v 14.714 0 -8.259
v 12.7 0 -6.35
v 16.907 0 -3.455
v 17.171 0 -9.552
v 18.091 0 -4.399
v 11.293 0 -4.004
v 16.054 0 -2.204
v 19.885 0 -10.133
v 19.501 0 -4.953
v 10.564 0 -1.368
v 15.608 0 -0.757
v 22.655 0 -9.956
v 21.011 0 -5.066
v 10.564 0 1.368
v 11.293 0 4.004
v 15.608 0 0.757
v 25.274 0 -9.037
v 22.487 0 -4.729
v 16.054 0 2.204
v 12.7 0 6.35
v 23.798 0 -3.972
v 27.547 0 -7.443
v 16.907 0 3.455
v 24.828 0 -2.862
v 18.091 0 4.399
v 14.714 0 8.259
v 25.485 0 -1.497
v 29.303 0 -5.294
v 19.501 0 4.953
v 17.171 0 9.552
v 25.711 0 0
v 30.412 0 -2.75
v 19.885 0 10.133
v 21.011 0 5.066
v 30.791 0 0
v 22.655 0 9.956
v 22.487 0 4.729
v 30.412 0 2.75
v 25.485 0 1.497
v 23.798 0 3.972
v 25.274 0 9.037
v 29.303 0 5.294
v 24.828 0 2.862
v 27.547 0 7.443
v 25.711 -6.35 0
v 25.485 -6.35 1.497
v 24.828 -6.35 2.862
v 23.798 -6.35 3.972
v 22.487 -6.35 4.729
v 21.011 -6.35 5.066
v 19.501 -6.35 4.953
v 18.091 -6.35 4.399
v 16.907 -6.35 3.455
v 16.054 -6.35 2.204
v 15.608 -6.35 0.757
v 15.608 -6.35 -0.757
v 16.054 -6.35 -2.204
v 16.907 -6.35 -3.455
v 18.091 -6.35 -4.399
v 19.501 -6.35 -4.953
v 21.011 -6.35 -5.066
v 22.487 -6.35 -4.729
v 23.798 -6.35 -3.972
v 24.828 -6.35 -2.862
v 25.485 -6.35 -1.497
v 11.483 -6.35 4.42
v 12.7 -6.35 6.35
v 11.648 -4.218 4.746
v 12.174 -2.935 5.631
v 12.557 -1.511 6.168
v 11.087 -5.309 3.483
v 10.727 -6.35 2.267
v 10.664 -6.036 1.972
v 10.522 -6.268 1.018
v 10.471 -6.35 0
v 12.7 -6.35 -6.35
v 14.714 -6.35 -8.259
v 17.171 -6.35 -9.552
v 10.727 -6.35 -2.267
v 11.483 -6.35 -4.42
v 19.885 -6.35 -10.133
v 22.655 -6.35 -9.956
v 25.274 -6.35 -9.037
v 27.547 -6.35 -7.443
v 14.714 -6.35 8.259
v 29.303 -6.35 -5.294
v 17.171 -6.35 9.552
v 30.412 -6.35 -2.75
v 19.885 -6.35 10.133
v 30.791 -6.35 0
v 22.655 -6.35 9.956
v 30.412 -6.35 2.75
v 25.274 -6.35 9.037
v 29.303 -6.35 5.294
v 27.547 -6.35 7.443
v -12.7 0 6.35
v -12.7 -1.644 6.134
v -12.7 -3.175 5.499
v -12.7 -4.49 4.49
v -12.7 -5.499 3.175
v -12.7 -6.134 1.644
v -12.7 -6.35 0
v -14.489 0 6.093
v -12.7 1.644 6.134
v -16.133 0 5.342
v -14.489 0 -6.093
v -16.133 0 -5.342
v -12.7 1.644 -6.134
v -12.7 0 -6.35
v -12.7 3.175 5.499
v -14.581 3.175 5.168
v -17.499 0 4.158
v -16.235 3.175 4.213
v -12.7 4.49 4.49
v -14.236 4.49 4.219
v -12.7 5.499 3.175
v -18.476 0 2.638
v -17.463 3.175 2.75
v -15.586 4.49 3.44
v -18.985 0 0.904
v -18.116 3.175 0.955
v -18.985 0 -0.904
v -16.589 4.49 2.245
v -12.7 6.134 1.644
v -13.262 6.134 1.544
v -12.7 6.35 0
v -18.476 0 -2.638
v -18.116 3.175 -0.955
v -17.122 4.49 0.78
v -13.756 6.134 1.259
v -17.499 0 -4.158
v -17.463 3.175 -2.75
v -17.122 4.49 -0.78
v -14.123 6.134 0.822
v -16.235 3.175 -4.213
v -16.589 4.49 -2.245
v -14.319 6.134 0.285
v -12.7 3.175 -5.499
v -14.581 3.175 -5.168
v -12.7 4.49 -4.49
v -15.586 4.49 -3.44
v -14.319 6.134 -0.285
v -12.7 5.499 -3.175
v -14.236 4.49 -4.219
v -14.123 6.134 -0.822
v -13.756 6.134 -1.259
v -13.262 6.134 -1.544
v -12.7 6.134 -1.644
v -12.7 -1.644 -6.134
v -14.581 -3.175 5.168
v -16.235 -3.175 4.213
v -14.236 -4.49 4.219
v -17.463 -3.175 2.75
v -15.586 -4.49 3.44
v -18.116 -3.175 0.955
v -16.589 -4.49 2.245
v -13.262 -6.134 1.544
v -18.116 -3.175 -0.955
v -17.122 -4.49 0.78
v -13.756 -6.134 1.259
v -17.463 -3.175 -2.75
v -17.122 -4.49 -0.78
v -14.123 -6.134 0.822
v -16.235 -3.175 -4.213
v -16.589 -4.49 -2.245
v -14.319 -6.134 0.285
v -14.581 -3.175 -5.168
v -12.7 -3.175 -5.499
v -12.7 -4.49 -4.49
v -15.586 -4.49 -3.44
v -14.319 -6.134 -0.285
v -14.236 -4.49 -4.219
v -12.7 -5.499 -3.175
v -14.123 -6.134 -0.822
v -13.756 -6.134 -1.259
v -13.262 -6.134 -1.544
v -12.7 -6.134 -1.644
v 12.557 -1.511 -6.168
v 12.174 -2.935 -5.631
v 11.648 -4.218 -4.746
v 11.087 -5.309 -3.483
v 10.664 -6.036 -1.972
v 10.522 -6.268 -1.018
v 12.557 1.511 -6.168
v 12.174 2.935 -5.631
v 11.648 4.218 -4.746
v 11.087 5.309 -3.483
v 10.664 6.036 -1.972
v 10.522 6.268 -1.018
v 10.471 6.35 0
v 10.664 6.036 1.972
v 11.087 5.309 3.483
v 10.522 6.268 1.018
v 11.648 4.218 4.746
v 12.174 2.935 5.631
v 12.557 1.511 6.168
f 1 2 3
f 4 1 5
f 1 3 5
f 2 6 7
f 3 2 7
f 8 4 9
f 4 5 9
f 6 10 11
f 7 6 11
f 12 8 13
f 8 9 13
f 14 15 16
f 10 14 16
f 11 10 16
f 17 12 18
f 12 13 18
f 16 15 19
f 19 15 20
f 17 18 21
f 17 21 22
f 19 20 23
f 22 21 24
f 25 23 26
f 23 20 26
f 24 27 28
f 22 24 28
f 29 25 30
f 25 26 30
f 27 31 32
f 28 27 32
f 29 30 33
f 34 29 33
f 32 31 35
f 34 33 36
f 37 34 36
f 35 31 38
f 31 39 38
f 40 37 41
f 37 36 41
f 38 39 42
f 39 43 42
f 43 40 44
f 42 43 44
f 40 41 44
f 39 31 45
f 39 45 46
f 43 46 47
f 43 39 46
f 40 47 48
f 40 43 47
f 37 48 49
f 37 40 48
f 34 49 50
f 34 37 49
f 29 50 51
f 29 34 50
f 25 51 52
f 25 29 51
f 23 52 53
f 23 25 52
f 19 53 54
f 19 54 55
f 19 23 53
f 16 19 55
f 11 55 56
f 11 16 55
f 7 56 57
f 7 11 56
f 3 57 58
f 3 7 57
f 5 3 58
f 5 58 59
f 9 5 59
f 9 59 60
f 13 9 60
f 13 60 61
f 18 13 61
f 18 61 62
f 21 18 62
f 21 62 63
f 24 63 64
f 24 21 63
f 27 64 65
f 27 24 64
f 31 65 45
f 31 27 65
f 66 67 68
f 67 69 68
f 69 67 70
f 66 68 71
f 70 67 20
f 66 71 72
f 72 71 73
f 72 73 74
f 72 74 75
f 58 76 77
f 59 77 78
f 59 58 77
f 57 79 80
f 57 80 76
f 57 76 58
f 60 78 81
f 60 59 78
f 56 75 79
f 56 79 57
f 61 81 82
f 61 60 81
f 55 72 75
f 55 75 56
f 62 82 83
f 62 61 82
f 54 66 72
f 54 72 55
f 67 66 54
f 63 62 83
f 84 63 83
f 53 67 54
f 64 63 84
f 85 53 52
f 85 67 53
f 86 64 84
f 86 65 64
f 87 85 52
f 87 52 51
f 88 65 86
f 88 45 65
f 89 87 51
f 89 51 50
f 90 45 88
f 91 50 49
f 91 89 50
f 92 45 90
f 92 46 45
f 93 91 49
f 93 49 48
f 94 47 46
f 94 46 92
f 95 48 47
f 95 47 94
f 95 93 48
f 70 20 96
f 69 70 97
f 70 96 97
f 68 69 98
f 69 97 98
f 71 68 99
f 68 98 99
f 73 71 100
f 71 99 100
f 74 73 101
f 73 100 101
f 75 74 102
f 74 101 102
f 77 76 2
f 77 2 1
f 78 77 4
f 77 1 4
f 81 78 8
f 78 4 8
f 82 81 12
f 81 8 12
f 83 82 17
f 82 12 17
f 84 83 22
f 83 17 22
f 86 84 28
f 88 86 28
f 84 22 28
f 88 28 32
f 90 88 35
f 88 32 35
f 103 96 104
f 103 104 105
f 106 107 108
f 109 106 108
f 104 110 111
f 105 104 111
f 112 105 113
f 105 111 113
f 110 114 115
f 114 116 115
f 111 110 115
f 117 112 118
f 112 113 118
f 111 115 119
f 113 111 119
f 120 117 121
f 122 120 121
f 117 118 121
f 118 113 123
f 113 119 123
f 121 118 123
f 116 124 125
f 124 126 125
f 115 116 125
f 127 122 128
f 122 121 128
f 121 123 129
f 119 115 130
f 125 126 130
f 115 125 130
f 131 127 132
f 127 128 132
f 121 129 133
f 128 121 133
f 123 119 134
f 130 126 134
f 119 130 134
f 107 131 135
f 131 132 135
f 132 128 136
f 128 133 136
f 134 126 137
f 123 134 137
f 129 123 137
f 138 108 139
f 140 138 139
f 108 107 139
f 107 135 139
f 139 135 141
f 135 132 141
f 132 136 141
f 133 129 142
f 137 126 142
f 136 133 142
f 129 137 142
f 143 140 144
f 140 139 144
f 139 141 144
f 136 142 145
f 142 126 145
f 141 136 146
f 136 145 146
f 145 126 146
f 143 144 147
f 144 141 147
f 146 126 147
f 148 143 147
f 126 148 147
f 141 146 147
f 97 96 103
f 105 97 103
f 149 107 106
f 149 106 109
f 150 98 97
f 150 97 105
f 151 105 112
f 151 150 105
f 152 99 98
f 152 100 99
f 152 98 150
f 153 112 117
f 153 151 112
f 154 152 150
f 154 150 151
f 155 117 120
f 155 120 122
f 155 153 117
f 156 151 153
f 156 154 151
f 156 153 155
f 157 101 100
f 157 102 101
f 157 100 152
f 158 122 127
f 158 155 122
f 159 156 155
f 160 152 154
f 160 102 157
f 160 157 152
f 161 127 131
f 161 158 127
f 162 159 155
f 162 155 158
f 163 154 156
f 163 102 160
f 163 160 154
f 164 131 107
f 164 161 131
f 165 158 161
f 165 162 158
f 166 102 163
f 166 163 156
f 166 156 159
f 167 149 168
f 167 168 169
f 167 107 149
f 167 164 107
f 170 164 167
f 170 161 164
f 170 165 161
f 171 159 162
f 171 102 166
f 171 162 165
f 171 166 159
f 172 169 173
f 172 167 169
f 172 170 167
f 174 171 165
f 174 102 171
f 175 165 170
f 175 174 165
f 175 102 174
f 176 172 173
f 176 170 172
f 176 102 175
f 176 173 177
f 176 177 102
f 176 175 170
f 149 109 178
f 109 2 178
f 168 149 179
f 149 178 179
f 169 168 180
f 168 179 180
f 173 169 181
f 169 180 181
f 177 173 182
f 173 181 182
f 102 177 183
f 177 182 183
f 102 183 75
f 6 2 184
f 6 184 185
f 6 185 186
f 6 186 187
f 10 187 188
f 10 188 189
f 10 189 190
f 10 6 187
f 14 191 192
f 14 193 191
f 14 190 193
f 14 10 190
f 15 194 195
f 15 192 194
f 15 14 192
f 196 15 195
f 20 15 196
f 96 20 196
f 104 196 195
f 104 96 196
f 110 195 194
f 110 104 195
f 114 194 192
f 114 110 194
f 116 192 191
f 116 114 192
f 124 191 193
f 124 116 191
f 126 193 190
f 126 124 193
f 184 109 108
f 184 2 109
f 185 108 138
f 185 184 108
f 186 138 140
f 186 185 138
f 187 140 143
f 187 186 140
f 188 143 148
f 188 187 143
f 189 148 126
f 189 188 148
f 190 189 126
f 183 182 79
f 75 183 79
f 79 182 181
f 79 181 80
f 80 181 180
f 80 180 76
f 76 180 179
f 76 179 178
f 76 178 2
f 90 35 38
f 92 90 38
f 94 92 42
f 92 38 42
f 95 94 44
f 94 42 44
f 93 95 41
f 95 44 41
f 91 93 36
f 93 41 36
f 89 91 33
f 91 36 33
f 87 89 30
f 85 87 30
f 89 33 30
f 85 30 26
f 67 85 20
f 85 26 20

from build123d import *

# Parameters (mm, degrees)
F1_DEPTH = 6.35
F2_R     = 6.3499
F0_R     = 5.08
F3_DEPTH = 6.35


# Not quite as in the source:
# - a fillet or chamfer is up to 0.001 mm smaller than in the source, because OpenCascade refuses the exact size


with BuildPart() as f1:
    # F0 (on Front) → F1 (new body, symmetric)
    with BuildSketch(Plane.XZ):
        with BuildLine():
            Line((12.7, 6.35), (-12.7, 6.35))
            Line((-12.7, 6.35), (-12.7, -6.35))
            Line((-12.7, -6.35), (12.7, -6.35))
            ThreePointArc((12.7, -6.35), (10.471147458, 0), (12.7, 6.35))
        make_face()
        with BuildLine():
            Line((-12.7, -6.35), (-12.7, 6.35))
            ThreePointArc((-12.7, 6.35), (-19.05, 0), (-12.7, -6.35))
        make_face()
    extrude(amount=F1_DEPTH, both=True)

    # F2 (radius 6.35 in the source; OpenCascade refuses exactly that, so slightly less here)
    f2_edges = [f1.edges().sort_by_distance(p)[0] for p in [
        (0, -6.35, 6.35),
        (0, 6.35, 6.35),
        (0, -6.35, -6.35),
        (0, 6.35, -6.35),
    ]]
    fillet(f2_edges, radius=F2_R)

    # F0 (on Front) → F3 (join)
    with BuildSketch(Plane.XZ):
        with BuildLine():
            ThreePointArc((30.791147458, 0), (23.9960502669, 9.5866067556), (12.7, 6.35))
            Line((12.7, 6.35), (12.7, -6.35))
            ThreePointArc((12.7, -6.35), (23.9960502669, -9.5866067556), (30.791147458, 0))
        make_face()
        with Locations((20.631147458, 0)):
            Circle(F0_R, mode=Mode.SUBTRACT)
        with BuildLine():
            Line((12.7, -6.35), (12.7, 6.35))
            ThreePointArc((12.7, 6.35), (10.471147458, 0), (12.7, -6.35))
        make_face()
    extrude(amount=F3_DEPTH)


solid = f1.part
